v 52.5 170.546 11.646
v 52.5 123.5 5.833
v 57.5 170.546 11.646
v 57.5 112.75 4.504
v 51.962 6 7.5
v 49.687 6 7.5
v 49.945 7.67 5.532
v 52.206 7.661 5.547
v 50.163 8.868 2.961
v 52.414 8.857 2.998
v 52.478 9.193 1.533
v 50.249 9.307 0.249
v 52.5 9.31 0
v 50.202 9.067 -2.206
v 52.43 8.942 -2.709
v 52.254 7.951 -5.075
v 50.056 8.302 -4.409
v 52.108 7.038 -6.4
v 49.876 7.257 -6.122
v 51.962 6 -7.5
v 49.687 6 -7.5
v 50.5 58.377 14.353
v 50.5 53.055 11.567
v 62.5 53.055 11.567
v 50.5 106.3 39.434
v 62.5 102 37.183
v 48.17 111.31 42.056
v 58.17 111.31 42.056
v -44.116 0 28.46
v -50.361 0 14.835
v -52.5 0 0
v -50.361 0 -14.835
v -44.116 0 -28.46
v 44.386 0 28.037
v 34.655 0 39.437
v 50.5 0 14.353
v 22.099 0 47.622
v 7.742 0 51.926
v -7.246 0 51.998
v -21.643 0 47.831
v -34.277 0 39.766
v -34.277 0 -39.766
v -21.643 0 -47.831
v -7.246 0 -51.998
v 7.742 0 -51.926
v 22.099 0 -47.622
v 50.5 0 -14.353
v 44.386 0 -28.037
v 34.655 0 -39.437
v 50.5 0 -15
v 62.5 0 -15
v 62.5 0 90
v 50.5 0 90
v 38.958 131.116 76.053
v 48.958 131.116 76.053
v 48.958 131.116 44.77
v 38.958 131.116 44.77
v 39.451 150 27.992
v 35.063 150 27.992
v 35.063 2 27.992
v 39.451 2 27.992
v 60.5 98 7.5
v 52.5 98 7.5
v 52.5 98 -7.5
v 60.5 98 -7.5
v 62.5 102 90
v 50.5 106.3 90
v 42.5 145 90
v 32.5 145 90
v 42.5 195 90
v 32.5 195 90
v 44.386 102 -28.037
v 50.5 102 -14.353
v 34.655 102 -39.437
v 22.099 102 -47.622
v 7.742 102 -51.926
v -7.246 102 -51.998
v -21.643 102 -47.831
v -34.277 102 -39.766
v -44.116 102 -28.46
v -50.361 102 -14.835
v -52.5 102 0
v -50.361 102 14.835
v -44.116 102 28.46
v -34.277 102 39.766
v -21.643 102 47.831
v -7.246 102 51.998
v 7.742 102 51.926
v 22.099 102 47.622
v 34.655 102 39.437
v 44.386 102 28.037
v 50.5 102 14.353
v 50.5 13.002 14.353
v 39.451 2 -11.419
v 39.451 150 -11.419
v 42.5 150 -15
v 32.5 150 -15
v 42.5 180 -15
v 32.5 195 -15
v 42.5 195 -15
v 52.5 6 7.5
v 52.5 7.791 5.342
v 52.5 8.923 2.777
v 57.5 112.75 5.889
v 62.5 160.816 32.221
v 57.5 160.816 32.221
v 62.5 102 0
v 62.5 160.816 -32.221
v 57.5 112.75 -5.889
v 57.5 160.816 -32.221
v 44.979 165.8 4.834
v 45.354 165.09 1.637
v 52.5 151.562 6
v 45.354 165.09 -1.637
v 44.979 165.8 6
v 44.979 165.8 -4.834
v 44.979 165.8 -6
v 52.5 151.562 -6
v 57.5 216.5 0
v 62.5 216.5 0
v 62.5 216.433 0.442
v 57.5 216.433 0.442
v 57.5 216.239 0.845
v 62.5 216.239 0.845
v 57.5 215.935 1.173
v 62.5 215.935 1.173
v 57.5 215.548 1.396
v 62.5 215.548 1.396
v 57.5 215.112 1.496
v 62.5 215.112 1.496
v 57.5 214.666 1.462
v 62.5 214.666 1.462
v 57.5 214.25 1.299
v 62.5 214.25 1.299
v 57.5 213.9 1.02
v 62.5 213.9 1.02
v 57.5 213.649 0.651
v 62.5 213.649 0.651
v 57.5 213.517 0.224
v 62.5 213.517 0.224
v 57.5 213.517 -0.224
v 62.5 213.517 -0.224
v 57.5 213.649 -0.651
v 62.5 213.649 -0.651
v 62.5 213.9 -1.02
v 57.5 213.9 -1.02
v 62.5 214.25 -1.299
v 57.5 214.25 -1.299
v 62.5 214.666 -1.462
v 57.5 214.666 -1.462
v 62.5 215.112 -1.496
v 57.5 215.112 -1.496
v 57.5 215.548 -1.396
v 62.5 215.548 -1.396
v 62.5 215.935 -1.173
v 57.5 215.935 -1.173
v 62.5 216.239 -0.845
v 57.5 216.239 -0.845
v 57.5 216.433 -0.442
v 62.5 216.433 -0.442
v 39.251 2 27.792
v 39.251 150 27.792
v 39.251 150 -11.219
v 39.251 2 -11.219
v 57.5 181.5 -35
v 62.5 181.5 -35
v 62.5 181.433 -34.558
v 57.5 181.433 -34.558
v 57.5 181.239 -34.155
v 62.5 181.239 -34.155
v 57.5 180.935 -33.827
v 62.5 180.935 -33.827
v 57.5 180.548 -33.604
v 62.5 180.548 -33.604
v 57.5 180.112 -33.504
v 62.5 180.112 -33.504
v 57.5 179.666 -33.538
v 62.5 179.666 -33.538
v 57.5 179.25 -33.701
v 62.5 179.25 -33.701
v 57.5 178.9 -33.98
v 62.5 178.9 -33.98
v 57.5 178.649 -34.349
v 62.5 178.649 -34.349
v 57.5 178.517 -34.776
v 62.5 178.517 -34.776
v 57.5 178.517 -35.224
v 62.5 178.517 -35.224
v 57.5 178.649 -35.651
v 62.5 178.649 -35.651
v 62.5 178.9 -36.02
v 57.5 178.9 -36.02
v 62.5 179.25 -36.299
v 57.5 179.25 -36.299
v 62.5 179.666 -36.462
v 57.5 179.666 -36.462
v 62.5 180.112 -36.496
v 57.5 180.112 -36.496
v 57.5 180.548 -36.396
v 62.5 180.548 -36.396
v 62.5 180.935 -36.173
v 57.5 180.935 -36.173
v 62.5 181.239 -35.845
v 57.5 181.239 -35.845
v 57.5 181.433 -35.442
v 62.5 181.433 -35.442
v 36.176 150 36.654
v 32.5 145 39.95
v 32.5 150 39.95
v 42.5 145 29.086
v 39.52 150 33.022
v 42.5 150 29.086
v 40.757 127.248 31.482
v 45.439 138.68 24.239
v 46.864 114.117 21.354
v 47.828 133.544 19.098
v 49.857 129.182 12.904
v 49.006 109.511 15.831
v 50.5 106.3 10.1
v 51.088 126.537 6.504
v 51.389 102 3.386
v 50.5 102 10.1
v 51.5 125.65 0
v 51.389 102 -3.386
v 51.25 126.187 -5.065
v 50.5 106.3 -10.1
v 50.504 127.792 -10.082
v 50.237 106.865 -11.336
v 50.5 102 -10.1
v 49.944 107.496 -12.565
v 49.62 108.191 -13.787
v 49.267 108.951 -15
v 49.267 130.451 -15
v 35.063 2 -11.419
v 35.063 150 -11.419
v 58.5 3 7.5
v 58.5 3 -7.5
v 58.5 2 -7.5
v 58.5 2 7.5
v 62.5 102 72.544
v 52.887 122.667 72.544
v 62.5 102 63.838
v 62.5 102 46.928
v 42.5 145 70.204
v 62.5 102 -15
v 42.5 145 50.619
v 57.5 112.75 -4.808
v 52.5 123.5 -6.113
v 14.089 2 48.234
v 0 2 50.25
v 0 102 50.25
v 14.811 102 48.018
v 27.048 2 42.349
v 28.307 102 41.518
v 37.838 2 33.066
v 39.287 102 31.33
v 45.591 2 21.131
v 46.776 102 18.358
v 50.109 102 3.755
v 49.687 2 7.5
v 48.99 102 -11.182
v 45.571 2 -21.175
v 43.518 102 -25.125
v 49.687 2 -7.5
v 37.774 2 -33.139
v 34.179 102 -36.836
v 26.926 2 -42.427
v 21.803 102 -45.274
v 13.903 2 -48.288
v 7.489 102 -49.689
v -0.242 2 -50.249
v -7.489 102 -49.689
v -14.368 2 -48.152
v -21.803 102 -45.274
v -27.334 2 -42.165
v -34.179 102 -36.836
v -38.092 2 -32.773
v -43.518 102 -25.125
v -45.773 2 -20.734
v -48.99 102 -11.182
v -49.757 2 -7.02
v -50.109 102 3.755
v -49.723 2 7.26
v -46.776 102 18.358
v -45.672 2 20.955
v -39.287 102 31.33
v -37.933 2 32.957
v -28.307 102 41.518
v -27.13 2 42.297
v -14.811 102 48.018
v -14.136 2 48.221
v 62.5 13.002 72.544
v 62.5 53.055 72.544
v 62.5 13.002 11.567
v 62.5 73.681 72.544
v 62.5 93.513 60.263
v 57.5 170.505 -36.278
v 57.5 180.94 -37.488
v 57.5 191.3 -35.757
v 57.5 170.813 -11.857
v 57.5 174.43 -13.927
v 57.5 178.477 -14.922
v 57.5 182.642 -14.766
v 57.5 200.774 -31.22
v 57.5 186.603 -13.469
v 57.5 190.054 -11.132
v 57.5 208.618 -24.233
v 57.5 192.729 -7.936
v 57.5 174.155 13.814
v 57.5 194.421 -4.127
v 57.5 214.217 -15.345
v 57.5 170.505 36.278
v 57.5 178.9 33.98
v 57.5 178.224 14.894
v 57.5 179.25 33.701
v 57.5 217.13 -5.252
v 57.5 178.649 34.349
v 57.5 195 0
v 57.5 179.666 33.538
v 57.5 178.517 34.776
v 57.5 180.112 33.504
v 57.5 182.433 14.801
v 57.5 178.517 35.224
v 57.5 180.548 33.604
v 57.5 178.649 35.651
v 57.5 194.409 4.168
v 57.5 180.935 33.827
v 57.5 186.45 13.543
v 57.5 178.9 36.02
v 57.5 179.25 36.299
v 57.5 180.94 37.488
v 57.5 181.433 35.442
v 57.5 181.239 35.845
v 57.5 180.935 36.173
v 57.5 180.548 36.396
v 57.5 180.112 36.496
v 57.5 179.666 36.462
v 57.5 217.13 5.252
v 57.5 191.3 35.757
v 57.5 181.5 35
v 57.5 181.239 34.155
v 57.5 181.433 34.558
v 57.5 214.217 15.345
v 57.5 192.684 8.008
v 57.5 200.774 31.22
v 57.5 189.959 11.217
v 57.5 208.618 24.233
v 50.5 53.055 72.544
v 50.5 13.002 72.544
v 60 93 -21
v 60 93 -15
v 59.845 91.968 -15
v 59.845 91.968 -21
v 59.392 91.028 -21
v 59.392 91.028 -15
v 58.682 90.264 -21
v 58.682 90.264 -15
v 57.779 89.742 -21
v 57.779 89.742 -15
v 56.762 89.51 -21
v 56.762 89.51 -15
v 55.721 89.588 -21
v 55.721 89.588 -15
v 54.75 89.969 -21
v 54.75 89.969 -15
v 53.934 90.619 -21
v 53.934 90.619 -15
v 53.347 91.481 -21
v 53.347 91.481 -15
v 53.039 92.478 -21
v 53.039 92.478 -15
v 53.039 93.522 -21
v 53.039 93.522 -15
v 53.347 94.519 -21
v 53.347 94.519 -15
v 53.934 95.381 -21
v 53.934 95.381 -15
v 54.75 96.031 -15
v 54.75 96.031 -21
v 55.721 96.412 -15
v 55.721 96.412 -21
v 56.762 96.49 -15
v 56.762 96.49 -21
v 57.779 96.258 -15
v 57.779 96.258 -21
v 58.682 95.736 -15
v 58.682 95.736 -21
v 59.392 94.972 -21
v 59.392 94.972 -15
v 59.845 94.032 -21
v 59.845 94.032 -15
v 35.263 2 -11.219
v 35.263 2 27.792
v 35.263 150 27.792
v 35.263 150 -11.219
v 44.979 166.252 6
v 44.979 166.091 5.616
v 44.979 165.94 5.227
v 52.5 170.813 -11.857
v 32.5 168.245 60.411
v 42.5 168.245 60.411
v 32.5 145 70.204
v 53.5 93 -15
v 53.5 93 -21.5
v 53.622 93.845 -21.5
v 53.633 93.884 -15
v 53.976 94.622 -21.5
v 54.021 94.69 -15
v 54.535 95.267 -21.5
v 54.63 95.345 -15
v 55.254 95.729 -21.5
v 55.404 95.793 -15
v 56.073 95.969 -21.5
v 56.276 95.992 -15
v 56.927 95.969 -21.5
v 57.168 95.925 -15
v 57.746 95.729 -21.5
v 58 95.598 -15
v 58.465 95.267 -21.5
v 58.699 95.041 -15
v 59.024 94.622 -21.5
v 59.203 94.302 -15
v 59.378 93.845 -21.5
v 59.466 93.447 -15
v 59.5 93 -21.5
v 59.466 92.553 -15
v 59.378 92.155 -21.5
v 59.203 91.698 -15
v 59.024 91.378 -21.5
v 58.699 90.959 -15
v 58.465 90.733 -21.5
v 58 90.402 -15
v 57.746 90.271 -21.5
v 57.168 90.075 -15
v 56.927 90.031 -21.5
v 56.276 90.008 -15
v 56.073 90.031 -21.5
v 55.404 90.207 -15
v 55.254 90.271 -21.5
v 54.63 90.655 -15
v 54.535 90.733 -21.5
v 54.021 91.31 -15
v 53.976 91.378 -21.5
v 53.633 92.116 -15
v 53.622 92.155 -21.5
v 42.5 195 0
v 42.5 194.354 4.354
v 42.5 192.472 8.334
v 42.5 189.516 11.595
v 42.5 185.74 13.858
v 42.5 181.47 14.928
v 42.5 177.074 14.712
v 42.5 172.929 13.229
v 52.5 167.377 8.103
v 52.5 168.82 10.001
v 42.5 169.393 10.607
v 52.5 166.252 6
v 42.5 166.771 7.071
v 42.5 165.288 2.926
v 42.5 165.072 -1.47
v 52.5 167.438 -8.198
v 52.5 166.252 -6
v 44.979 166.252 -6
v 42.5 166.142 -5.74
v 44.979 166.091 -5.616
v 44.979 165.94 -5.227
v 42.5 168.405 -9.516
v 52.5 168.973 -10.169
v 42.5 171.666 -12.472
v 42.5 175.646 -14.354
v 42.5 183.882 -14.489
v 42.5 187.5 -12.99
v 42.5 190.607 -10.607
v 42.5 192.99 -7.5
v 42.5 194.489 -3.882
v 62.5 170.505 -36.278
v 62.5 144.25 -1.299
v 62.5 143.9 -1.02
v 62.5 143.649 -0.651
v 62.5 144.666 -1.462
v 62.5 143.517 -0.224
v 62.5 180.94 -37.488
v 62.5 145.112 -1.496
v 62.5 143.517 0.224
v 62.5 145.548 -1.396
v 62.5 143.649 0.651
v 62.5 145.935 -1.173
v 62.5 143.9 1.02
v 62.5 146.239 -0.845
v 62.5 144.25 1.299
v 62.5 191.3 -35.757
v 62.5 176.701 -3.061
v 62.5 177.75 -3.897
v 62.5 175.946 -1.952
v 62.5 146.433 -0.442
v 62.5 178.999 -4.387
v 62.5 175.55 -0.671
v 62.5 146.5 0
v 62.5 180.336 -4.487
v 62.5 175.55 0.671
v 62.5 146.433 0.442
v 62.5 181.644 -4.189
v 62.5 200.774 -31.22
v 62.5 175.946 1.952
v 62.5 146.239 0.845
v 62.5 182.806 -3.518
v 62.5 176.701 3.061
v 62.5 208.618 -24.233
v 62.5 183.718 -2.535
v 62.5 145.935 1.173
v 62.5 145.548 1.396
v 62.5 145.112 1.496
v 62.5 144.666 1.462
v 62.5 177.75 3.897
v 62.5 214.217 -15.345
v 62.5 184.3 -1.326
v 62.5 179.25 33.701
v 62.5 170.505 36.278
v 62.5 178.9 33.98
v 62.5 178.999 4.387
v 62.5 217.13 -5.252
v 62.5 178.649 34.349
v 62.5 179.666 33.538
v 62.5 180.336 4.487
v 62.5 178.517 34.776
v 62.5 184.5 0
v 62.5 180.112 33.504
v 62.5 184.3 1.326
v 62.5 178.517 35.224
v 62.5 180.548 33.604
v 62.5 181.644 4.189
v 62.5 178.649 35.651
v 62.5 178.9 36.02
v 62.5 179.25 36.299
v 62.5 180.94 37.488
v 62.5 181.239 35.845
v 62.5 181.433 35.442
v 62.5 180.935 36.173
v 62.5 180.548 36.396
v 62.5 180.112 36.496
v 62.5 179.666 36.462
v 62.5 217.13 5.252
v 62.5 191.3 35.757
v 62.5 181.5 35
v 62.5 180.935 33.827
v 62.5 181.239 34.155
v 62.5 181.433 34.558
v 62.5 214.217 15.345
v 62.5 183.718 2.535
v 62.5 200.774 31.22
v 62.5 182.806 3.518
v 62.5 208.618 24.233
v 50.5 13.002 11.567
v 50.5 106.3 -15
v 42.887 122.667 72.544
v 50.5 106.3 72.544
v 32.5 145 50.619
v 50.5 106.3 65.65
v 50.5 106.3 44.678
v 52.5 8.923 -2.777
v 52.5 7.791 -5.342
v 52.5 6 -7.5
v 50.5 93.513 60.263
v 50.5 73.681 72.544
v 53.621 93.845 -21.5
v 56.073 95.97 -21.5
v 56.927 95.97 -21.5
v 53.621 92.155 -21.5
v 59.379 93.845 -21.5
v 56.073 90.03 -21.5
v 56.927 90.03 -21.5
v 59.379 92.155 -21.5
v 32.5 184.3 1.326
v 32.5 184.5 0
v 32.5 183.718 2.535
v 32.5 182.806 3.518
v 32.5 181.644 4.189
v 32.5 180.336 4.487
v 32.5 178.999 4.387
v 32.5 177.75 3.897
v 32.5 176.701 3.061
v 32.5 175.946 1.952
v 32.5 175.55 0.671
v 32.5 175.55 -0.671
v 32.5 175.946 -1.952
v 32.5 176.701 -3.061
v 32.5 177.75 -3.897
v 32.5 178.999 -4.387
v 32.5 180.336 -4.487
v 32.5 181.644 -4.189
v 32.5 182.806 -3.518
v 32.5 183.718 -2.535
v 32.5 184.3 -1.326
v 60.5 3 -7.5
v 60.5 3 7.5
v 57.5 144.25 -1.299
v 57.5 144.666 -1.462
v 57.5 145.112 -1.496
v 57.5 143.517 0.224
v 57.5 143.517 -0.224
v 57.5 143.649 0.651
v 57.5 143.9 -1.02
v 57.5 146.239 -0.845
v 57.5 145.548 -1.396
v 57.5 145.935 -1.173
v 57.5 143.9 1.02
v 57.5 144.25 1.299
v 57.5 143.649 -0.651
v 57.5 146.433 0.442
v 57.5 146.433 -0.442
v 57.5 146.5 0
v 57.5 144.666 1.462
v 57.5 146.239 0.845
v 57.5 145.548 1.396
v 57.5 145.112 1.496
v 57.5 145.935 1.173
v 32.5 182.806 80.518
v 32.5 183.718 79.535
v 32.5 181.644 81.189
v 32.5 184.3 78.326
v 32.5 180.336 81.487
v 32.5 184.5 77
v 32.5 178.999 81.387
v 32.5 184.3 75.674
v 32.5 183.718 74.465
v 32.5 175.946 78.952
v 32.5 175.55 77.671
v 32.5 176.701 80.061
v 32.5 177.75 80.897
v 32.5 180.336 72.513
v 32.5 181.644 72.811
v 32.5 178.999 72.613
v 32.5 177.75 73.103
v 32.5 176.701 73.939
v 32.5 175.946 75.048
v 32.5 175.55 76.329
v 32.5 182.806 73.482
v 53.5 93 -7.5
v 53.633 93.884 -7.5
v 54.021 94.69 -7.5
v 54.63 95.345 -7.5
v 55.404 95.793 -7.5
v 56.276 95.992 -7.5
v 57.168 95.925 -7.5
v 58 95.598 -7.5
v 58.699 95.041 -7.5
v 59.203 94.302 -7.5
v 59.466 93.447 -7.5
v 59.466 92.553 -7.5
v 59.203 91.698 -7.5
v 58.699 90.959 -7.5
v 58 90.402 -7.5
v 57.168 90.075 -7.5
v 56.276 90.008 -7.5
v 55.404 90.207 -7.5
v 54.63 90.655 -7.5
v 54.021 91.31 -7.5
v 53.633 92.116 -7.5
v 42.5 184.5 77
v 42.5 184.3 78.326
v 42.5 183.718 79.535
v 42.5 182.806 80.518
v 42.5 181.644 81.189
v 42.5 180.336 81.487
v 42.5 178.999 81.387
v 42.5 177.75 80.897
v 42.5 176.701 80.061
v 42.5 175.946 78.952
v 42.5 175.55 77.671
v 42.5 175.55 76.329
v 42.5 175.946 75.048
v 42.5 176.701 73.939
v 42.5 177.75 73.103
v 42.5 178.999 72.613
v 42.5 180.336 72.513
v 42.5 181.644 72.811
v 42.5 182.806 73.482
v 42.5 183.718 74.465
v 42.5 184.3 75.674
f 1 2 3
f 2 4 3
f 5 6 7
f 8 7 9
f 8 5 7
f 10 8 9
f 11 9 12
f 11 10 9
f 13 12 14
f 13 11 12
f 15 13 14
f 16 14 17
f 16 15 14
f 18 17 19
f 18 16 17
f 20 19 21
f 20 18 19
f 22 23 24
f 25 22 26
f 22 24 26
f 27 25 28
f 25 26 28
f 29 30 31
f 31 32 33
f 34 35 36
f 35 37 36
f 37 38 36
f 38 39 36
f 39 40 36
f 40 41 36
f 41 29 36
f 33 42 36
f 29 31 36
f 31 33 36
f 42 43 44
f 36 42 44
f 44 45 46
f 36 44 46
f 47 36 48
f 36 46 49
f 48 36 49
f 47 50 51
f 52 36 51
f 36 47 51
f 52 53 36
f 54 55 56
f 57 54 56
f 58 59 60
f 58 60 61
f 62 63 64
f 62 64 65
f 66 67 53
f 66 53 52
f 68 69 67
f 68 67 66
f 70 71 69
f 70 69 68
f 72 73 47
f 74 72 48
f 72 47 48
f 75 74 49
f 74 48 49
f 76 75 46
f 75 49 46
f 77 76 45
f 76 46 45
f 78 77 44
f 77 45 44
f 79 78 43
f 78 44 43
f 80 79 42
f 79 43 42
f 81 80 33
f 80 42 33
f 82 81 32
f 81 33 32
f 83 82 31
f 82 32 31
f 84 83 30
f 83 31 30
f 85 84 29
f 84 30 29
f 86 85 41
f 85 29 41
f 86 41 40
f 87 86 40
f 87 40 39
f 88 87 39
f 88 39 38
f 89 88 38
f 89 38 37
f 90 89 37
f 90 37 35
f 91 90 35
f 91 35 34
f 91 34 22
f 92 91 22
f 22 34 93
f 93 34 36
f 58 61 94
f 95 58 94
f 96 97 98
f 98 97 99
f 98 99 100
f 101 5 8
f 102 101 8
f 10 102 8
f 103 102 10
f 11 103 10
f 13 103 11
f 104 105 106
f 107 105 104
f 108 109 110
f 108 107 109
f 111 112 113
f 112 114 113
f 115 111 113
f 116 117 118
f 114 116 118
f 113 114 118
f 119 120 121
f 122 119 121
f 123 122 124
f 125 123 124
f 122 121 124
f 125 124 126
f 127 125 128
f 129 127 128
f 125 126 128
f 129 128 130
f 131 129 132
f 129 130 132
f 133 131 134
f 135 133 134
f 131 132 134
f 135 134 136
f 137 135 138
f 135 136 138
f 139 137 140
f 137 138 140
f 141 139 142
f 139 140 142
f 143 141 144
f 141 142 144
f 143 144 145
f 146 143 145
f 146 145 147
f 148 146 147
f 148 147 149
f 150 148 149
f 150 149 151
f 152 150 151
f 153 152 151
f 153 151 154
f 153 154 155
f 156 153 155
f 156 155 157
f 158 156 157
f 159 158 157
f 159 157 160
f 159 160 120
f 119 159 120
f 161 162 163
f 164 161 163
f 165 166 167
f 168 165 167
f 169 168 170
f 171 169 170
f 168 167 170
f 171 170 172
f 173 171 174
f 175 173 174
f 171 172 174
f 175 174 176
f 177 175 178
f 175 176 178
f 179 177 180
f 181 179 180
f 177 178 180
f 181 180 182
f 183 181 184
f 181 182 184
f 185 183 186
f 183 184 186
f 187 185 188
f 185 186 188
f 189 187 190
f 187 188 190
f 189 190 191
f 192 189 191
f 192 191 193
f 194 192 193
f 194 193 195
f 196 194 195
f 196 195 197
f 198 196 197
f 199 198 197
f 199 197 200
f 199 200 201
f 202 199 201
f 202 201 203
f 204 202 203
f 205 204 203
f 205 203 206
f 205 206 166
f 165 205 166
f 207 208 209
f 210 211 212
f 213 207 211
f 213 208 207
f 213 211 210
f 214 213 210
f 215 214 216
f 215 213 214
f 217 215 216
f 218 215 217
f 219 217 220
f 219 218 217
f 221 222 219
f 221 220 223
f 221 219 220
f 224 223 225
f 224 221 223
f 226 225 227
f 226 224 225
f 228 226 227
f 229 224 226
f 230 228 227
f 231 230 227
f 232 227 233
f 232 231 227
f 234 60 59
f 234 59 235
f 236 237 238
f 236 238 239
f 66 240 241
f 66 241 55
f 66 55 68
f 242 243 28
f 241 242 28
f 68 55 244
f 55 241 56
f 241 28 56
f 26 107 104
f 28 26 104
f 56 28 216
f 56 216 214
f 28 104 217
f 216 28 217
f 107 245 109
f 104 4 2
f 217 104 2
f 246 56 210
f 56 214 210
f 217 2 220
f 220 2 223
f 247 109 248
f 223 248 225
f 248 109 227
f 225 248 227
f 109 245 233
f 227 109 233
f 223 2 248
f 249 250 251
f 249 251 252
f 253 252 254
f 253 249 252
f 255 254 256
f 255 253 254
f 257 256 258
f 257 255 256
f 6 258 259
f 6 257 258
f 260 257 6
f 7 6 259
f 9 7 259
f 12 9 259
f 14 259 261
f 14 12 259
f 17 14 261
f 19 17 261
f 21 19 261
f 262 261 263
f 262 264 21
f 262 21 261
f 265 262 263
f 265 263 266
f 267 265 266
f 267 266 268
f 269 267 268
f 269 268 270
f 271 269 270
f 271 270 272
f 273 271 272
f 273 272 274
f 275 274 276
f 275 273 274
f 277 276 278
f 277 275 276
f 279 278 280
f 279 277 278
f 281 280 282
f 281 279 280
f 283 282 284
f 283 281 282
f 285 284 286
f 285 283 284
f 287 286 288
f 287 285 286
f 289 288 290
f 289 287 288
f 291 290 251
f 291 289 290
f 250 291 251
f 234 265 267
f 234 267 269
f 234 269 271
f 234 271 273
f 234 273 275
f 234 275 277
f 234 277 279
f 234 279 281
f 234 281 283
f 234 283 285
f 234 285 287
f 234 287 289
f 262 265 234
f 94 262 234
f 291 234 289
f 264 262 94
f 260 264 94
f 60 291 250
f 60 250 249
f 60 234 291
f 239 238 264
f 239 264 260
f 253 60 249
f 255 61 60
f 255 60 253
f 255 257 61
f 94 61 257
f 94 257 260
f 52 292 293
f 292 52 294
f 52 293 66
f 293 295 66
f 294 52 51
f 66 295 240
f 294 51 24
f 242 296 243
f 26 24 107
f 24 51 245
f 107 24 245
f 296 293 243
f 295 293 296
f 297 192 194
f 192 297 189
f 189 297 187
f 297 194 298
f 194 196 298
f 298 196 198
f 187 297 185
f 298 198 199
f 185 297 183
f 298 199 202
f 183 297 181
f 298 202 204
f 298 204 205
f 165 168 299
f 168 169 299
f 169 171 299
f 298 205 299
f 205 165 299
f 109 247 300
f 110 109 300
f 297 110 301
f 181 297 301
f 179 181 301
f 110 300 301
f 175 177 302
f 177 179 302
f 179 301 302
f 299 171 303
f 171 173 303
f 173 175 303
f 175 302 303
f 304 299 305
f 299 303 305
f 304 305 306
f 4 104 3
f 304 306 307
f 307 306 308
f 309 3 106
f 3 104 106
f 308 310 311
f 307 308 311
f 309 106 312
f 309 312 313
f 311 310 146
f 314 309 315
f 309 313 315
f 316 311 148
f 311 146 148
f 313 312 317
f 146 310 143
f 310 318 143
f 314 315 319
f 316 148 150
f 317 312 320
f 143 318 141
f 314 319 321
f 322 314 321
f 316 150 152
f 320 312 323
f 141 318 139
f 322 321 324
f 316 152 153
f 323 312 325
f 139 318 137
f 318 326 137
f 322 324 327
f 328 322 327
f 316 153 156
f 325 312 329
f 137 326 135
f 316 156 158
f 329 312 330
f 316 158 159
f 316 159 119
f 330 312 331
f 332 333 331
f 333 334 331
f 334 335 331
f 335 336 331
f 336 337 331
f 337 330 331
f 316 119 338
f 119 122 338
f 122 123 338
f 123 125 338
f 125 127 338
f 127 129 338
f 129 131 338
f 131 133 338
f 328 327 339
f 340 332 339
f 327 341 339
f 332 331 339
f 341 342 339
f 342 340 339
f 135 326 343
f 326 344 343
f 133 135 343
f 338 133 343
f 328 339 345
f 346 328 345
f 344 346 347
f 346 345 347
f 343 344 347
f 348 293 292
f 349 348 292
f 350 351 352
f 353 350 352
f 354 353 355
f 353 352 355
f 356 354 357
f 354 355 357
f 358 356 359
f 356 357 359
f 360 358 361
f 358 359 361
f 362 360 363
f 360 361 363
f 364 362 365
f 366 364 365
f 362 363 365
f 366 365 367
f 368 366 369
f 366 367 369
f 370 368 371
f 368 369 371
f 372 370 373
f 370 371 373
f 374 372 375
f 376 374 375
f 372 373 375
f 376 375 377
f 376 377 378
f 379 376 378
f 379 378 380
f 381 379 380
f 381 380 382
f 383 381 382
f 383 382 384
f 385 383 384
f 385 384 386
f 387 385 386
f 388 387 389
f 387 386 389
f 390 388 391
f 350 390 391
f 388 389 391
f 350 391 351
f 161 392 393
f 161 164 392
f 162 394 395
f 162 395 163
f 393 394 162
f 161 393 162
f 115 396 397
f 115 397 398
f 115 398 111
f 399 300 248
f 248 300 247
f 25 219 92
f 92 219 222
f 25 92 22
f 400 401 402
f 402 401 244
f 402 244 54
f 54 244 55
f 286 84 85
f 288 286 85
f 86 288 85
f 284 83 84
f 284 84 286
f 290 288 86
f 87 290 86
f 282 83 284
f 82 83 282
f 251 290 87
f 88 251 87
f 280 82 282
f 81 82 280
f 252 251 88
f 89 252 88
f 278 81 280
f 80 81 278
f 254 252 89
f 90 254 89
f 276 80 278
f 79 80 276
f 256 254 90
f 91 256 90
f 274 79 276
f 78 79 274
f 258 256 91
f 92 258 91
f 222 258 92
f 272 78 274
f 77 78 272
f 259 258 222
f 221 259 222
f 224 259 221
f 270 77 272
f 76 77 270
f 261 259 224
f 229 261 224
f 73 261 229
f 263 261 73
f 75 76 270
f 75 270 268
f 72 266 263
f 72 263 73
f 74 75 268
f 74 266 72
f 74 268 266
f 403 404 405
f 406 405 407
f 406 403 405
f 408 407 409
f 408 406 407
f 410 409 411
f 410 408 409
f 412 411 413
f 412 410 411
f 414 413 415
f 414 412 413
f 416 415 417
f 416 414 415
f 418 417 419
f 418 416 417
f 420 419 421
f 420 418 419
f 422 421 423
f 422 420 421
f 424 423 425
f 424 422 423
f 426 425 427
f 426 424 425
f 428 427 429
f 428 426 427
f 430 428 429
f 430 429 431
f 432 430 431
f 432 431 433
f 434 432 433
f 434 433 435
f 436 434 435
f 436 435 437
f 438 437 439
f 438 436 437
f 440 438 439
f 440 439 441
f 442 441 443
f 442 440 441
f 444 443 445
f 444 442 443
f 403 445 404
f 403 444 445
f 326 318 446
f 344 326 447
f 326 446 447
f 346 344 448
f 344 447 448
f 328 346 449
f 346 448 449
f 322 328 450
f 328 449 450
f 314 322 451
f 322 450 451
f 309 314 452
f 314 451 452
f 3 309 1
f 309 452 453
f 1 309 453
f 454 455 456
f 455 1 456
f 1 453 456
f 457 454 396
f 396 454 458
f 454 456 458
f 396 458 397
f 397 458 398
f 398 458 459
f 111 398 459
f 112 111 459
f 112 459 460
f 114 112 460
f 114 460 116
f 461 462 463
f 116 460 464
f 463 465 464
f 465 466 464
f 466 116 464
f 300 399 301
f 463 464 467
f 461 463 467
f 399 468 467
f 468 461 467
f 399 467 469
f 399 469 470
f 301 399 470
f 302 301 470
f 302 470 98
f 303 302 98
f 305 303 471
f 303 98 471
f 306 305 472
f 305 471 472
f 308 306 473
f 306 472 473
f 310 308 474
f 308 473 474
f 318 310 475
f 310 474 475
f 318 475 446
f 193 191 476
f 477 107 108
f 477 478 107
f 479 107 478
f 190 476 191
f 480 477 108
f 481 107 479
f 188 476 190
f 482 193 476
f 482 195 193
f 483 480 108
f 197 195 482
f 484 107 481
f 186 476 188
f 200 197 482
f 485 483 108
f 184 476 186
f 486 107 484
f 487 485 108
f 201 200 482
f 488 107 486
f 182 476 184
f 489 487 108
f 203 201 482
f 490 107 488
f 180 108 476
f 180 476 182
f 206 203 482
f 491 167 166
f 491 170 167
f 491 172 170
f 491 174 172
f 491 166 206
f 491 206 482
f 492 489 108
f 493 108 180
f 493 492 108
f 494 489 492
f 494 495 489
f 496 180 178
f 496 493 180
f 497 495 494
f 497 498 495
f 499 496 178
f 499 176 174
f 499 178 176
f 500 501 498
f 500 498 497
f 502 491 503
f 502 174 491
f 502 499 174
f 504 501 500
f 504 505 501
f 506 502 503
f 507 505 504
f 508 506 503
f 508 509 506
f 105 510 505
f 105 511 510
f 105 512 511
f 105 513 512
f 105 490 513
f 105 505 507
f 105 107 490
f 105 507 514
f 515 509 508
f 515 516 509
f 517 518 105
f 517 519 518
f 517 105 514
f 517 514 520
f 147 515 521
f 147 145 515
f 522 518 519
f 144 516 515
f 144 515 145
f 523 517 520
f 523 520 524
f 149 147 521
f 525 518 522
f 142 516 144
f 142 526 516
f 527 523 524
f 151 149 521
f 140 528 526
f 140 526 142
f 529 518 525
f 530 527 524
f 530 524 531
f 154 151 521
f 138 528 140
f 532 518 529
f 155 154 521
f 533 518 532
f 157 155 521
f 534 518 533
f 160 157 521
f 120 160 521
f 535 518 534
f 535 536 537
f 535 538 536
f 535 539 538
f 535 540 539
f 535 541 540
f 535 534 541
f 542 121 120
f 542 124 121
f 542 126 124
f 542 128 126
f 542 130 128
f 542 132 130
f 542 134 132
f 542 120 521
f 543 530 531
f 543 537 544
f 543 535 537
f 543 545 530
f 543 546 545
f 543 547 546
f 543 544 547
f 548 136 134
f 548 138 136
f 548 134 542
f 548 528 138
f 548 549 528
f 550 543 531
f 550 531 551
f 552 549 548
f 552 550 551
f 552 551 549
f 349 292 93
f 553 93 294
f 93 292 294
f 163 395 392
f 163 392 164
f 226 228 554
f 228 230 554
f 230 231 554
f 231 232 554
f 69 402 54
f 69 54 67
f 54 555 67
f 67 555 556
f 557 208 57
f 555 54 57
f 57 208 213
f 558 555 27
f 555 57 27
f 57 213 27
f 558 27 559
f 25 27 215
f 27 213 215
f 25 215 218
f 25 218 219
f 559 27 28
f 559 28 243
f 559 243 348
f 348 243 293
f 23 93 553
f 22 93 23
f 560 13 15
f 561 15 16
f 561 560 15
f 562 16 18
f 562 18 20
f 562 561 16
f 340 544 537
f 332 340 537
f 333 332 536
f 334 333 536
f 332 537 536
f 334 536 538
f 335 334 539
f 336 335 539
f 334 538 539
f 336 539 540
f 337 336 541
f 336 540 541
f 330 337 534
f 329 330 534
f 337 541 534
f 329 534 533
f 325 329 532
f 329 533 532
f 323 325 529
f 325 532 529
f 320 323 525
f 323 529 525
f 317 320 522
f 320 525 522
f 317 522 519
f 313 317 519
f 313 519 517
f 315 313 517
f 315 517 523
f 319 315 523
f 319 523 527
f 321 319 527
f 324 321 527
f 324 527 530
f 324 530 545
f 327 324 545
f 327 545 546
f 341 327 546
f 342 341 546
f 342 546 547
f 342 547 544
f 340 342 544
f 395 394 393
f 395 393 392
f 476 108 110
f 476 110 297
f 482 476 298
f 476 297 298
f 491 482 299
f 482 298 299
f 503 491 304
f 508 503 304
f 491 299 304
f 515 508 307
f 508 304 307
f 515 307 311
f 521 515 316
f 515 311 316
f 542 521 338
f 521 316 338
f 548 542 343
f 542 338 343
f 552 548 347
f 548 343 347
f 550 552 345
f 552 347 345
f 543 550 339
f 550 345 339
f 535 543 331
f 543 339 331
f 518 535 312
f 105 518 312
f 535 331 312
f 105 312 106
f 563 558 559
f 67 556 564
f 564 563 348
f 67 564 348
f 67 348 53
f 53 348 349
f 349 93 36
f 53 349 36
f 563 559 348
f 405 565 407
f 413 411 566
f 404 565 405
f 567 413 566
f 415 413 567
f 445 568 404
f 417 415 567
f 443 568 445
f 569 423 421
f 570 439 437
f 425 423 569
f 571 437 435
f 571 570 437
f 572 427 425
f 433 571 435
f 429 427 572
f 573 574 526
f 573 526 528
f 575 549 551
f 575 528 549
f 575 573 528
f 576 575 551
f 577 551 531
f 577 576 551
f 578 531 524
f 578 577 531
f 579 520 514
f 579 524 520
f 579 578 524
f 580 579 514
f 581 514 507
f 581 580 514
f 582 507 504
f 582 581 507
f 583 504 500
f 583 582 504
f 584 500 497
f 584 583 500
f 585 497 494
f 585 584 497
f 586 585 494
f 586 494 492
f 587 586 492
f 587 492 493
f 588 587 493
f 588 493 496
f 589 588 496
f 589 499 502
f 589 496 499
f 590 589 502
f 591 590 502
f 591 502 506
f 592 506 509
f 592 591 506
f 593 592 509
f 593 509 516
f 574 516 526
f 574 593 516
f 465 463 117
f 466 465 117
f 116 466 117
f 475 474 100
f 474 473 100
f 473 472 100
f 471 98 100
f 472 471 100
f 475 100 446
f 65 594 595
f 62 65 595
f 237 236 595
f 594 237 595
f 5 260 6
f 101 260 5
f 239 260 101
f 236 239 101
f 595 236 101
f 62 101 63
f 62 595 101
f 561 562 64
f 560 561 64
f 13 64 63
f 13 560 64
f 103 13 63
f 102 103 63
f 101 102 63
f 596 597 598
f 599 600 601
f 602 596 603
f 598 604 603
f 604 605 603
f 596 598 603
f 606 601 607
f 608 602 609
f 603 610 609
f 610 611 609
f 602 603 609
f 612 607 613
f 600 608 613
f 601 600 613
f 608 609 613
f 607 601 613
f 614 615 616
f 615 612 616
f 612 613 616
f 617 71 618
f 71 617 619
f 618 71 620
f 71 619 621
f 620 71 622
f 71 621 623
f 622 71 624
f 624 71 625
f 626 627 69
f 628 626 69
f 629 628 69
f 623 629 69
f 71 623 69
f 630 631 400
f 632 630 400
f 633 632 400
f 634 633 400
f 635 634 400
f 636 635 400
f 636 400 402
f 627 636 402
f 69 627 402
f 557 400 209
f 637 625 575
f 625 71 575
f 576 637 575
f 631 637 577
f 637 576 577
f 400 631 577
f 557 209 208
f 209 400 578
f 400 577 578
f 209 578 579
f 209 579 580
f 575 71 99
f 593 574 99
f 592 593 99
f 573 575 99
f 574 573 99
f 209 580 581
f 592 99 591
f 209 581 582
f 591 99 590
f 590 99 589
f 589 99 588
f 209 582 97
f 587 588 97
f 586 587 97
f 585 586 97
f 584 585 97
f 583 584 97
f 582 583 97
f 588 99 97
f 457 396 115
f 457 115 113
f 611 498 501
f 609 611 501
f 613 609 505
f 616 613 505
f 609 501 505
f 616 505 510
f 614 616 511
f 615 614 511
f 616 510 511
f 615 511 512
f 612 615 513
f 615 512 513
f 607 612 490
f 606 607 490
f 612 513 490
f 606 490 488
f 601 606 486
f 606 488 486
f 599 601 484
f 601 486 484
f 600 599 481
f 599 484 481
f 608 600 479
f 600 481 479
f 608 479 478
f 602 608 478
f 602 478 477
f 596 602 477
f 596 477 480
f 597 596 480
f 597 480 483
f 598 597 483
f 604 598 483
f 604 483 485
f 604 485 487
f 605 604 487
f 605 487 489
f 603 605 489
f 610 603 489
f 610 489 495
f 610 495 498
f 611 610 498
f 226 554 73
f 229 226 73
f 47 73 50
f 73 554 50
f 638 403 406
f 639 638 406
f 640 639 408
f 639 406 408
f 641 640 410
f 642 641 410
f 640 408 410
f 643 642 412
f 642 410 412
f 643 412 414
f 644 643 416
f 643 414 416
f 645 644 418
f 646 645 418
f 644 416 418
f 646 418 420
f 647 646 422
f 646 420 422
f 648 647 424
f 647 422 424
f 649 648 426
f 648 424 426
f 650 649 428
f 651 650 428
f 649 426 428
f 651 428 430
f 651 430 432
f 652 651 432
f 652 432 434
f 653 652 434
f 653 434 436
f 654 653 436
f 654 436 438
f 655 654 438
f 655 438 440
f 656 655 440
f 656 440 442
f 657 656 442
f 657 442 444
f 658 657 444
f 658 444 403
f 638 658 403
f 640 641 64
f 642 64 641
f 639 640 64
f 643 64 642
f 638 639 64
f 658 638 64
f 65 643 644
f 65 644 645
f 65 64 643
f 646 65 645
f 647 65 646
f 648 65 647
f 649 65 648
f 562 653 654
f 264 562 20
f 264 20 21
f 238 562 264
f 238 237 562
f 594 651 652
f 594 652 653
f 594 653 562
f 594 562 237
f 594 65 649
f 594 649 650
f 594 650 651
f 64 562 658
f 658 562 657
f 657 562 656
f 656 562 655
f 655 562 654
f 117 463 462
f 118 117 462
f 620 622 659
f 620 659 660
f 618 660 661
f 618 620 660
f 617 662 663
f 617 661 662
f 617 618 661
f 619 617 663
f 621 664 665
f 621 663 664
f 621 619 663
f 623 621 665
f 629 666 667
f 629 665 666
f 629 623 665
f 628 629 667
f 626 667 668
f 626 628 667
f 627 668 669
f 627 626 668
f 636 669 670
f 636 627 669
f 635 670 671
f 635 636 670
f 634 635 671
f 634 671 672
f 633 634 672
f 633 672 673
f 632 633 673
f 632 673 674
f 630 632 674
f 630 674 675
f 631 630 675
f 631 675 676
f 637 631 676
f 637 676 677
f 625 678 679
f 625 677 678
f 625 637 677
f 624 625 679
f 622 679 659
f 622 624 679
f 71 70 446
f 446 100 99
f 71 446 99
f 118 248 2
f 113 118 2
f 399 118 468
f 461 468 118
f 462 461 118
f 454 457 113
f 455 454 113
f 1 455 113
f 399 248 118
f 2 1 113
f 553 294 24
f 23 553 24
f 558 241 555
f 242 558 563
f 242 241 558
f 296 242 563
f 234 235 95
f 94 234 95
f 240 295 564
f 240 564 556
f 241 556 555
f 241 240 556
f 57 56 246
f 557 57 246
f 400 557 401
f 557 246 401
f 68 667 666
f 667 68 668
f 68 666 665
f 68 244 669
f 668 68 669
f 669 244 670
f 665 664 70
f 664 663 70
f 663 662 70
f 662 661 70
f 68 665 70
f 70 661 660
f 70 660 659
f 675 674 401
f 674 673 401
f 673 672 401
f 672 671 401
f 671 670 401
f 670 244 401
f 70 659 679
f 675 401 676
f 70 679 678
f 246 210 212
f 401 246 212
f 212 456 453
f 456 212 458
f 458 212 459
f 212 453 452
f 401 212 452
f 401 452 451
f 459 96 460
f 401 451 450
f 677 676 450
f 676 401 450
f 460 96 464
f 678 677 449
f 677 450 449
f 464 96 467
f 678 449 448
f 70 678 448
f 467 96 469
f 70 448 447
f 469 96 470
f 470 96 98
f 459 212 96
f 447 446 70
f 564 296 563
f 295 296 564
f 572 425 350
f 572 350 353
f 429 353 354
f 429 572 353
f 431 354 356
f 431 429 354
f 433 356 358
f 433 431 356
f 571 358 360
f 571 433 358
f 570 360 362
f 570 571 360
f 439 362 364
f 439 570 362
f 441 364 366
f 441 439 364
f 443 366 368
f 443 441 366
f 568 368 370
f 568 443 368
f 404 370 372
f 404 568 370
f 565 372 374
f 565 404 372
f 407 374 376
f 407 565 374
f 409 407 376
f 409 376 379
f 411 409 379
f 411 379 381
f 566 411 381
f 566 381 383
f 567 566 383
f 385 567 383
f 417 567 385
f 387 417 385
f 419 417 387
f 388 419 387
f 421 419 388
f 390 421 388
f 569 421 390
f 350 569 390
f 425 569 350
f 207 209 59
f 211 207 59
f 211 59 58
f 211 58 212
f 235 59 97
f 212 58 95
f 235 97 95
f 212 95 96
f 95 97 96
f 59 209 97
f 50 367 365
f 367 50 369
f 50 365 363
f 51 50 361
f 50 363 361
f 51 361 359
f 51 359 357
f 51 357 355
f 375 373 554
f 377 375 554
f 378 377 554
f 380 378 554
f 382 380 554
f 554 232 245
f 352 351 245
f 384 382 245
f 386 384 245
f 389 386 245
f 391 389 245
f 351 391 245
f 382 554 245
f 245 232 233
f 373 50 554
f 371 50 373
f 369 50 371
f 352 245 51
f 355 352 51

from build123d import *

# Parameters (mm, degrees)
SKETCH1_R                = 52.5
BOSS_EXTRUDE1_DEPTH      = 2
SKETCH2_R                = 52.5
SKETCH2_R_2              = 50.25
BOSS_EXTRUDE2_DEPTH      = 100
BOSS_EXTRUDE3_DEPTH      = 90
BOSS_EXTRUDE3_DEPTH_BACK = 15
BOSS_EXTRUDE4_DEPTH      = 15
BOSS_EXTRUDE4_DEPTH_BACK = 10
SKETCH7_R                = 15
SKETCH8_R                = 37.5
BOSS_EXTRUDE5_DEPTH      = 5
SKETCH9_R                = 1.5
CUT_EXTRUDE1_DEPTH       = 6
CUT_EXTRUDE2_DEPTH       = 265.804278799
CUT_EXTRUDE2_DEPTH_BACK  = 265.804278799
SKETCH5_R                = 4.5
CUT_EXTRUDE3_START       = -4
CUT_EXTRUDE3_DEPTH       = 20
CUT_EXTRUDE4_START       = -3
SKETCH11_W               = 8
SKETCH11_H               = 15
CUT_EXTRUDE4_DEPTH       = 95
SKETCH12_R               = 3
CUT_EXTRUDE5_DEPTH       = 20
SKETCH13_R               = 3.5
SKETCH13_R_2             = 3
BOSS_EXTRUDE6_DEPTH      = 6.5
CHAMFER1_SIZE            = 0.5
SKETCH14_R               = 51.5
CUT_EXTRUDE6_DEPTH       = 48
SKETCH15_R               = 1.5
BOSS_EXTRUDE7_DEPTH      = 5
BOSS_EXTRUDE8_DEPTH      = 5
BOSS_EXTRUDE9_DEPTH      = 6
BOSS_EXTRUDE9_DEPTH_BACK = 6
SKETCH18_W               = 4.388119868
SKETCH18_H               = 39.410417959
SKETCH18_W_2             = 3.988119868
SKETCH18_H_2             = 39.010417959
BOSS_EXTRUDE10_DEPTH     = 148
CUT_EXTRUDE7_DEPTH       = 12
CUT_EXTRUDE8_REACH       = 263.976


with BuildPart() as part:
    # Sketch1 → Boss-Extrude1 (new body)
    with BuildSketch(Plane(origin=(0, 0, 0), x_dir=(1, 0, 0), z_dir=(0, 1, 0))):
        with Locations(Location((0, 0, 0), (0, 0, 270))):
            Circle(SKETCH1_R)
    extrude(amount=BOSS_EXTRUDE1_DEPTH)

    # Sketch2 → Boss-Extrude2 (add)
    with BuildSketch(Plane(origin=(0, 2, 0), x_dir=(1, 0, 0), z_dir=(0, 1, 0))):
        with Locations(Location((0, 0, 0), (0, 0, 270))):
            Circle(SKETCH2_R)
        with Locations(Location((0, 0, 0), (0, 0, 270))):
            Circle(SKETCH2_R_2, mode=Mode.SUBTRACT)
    extrude(amount=BOSS_EXTRUDE2_DEPTH)


with BuildPart() as body_2:
    # Sketch6 → Boss-Extrude3 (new, two sides: drawn at the far end of the back side and taken through both)
    with BuildSketch(Plane.XY.offset(-BOSS_EXTRUDE3_DEPTH_BACK)):
        Polygon((32.5, 195), (32.5, 145), (50.5, 106.3), (50.5, 0), (52.5, 0), (62.5, 0), (62.5, 102), (42.5, 145), (42.5, 195), align=None)
    extrude(amount=BOSS_EXTRUDE3_DEPTH + BOSS_EXTRUDE3_DEPTH_BACK)

    # Sketch7 → Boss-Extrude4 (add, two sides: drawn at the far end of the back side and taken through both)
    with BuildSketch(Plane(origin=(42.5, 0, 0), x_dir=(0, 0, -1), z_dir=(1, 0, 0)).offset(-BOSS_EXTRUDE4_DEPTH_BACK)):
        with Locations(Location((0, 180, 0), (0, 0, 90))):
            Circle(SKETCH7_R)
    extrude(amount=BOSS_EXTRUDE4_DEPTH + BOSS_EXTRUDE4_DEPTH_BACK)

    # Sketch8 → Boss-Extrude5 (add)
    with BuildSketch(Plane(origin=(57.5, 0, 0), x_dir=(0, 0, -1), z_dir=(1, 0, 0))):
        with Locations(Location((0, 180, 0), (0, 0, 90))):
            Circle(SKETCH8_R)
    extrude(amount=BOSS_EXTRUDE5_DEPTH)

    # Sketch9 → Cut-Extrude1 (cut)
    with BuildSketch(Plane(origin=(62.5, 0, 0), x_dir=(0, 0, -1), z_dir=(1, 0, 0))):
        with Locations(Location((-35, 180, 0), (0, 0, 90))):
            Circle(SKETCH9_R)
        with Locations(Location((0, 215, 0), (0, 0, 90))):
            Circle(SKETCH9_R)
        with Locations(Location((35, 180, 0), (0, 0, 90))):
            Circle(SKETCH9_R)
        with Locations(Location((0, 145, 0), (0, 0, 90))):
            Circle(SKETCH9_R)
    extrude(amount=-CUT_EXTRUDE1_DEPTH, mode=Mode.SUBTRACT)

    # Sketch5 → Cut-Extrude2 (cut, two sides: drawn at the far end of the back side and taken through both)
    with BuildSketch(Plane(origin=(68.805630826, 0, 0), x_dir=(0, 0, -1), z_dir=(1, 0, 0)).offset(-CUT_EXTRUDE2_DEPTH_BACK)):
        with Locations(Location((0, 180, 0), (0, 0, 90))):
            Circle(SKETCH5_R)
        with Locations(Location((-77, 180, 0), (0, 0, 90))):
            Circle(SKETCH5_R)
    extrude(amount=CUT_EXTRUDE2_DEPTH + CUT_EXTRUDE2_DEPTH_BACK, mode=Mode.SUBTRACT)


with BuildPart() as cut_extrude3_tool:
    # Sketch10 → Cut-Extrude3 (new body)
    with BuildSketch(Plane(origin=(62.5, 0, 0), x_dir=(0, 0, -1), z_dir=(1, 0, 0)).offset(CUT_EXTRUDE3_START)):
        with BuildLine():
            Line((7.5, 2), (-7.5, 2))
            Line((-7.5, 2), (-7.5, 6))
            ThreePointArc((-7.5, 6), (0, 9.309773059), (7.5, 6))
            Line((7.5, 6), (7.5, 2))
        make_face()
    extrude(amount=-CUT_EXTRUDE3_DEPTH)


with BuildPart() as part_1:
    add(part.part)

    # Cut-Extrude3: cut by cut_extrude3_tool
    add(cut_extrude3_tool.part, mode=Mode.SUBTRACT)



with BuildPart() as body_2_1:
    add(body_2.part)

    # Cut-Extrude3: cut by cut_extrude3_tool
    add(cut_extrude3_tool.part, mode=Mode.SUBTRACT)

    # Sketch11 → Cut-Extrude4 (cut)
    with BuildSketch(Plane.XZ.offset(CUT_EXTRUDE4_START)):
        with Locations((56.5, 0)):
            Rectangle(SKETCH11_W, SKETCH11_H)
    extrude(amount=-CUT_EXTRUDE4_DEPTH, mode=Mode.SUBTRACT)

    # Sketch12 → Cut-Extrude5 (cut)
    with BuildSketch(Plane(origin=(0, 0, -15), x_dir=(-1, 0, 0), z_dir=(0, 0, -1))):
        with Locations((-56.5, 93)):
            Circle(SKETCH12_R)
    extrude(amount=-CUT_EXTRUDE5_DEPTH, mode=Mode.SUBTRACT)

    # Sketch13 → Boss-Extrude6 (add)
    with BuildSketch(Plane(origin=(0, 0, -15), x_dir=(-1, 0, 0), z_dir=(0, 0, -1))):
        with Locations(Location((-56.5, 93, 0), (0, 0, 180))):
            Circle(SKETCH13_R)
        with Locations((-56.5, 93)):
            Circle(SKETCH13_R_2, mode=Mode.SUBTRACT)
    extrude(amount=BOSS_EXTRUDE6_DEPTH)

    # Chamfer1
    chamfer1_edges = [body_2_1.edges().sort_by_distance(p)[0] for p in [
        (53, 93, -21.5),
    ]]
    chamfer(chamfer1_edges, length=CHAMFER1_SIZE - 0.0001)  # a hair under: the kernel refuses the full size

    # Sketch14 → Cut-Extrude6 (cut)
    with BuildSketch(Plane(origin=(0, 102, 0), x_dir=(1, 0, 0), z_dir=(0, 1, 0))):
        Circle(SKETCH14_R)
    extrude(amount=CUT_EXTRUDE6_DEPTH, mode=Mode.SUBTRACT)

    # Sketch15 → Boss-Extrude7 (add)
    with BuildSketch(Plane(origin=(62.5, 0, 0), x_dir=(0, 0, -1), z_dir=(1, 0, 0))):
        Polygon((-33.512753614, 163.173076775), (0, 102), (33.512753614, 163.173076775), align=None)
        with Locations(Location((0, 145, 0), (0, 0, 90))):
            Circle(SKETCH15_R, mode=Mode.SUBTRACT)
    extrude(amount=-BOSS_EXTRUDE7_DEPTH)

    # Sketch16 → Boss-Extrude8 (add)
    with BuildSketch(Plane.ZY.offset(-57.5)):
        Polygon((-11.8572367, 170.812729576), (-3.863517383, 104.969648), (3.542835396, 104.969648), (11.646025701, 170.546424731), align=None)
    extrude(amount=BOSS_EXTRUDE8_DEPTH)

    # Sketch17 → Boss-Extrude9 (add, two sides: drawn at the far end of the back side and taken through both)
    with BuildSketch(Plane.XY.offset(-BOSS_EXTRUDE9_DEPTH_BACK)):
        Polygon((44.979042662, 173.247563953), (44.979042662, 165.800390699), (53.161932833, 150.308684598), (53.161932833, 173.247563953), align=None)
    extrude(amount=BOSS_EXTRUDE9_DEPTH + BOSS_EXTRUDE9_DEPTH_BACK)


with BuildPart() as part_2:
    add(part_1.part)

    add(body_2_1.part)  # Boss-Extrude10 merges body 2
    # Sketch18 → Boss-Extrude10 (add)
    with BuildSketch(Plane(origin=(0, 2, 0), x_dir=(1, 0, 0), z_dir=(0, 1, 0))):
        with Locations((37.256595202, -8.286604054)):
            Rectangle(SKETCH18_W, SKETCH18_H)
        with Locations((37.256595202, -8.286604053)):
            Rectangle(SKETCH18_W_2, SKETCH18_H_2, mode=Mode.SUBTRACT)
    extrude(amount=BOSS_EXTRUDE10_DEPTH)

    # Sketch19 → Cut-Extrude7 (cut)
    with BuildSketch(Plane(origin=(62.5, 0, 0), x_dir=(0, 0, -1), z_dir=(1, 0, 0))):
        Polygon((-72.544377907, 13.00185454), (-11.567320289, 13.00185454), (-11.567320289, 53.055277221), (-42.055849098, 111.310144767), (-72.544377907, 53.055277221), align=None)
        Polygon((-76.052706901, 131.115597336), (-44.770106705, 131.115597336), (-60.411406803, 168.245412522), align=None)
        Polygon((-72.544377907, 73.680676562), (-72.544377907, 122.667191379), (-60.262958239, 93.513167119), align=None)
    extrude(amount=-CUT_EXTRUDE7_DEPTH, mode=Mode.SUBTRACT)

    # Cut-Extrude8: up to this face of the body (flat: up to its plane)
    cut_extrude8_end = Plane(part_2.part.faces().sort_by_distance((42.166193849, 124.217683224, 58.964397348))[0])
    # Sketch19<2> → Cut-Extrude8 (cut, up to the picked face)
    with BuildSketch(Plane(origin=(62.5, 0, 0), x_dir=(0, 0, -1), z_dir=(1, 0, 0)), mode=Mode.PRIVATE) as cut_extrude8_sk1:
        Polygon((-72.544377907, 13.00185454), (-11.567320289, 13.00185454), (-11.567320289, 53.055277221), (-42.055849098, 111.310144767), (-72.544377907, 53.055277221), align=None)
    cut_extrude8_tool1 = split(extrude(cut_extrude8_sk1.sketch, amount=-CUT_EXTRUDE8_REACH, mode=Mode.PRIVATE), bisect_by=cut_extrude8_end, keep=Keep.BOTH, mode=Mode.PRIVATE)
    # Sketch19<2> → Cut-Extrude8 (cut, up to the picked face)
    with BuildSketch(Plane(origin=(62.5, 0, 0), x_dir=(0, 0, -1), z_dir=(1, 0, 0)), mode=Mode.PRIVATE) as cut_extrude8_sk2:
        Polygon((-76.052706901, 131.115597336), (-44.770106705, 131.115597336), (-60.411406803, 168.245412522), align=None)
    cut_extrude8_tool2 = split(extrude(cut_extrude8_sk2.sketch, amount=-CUT_EXTRUDE8_REACH, mode=Mode.PRIVATE), bisect_by=cut_extrude8_end, keep=Keep.BOTH, mode=Mode.PRIVATE)
    # Sketch19<2> → Cut-Extrude8 (cut, up to the picked face)
    with BuildSketch(Plane(origin=(62.5, 0, 0), x_dir=(0, 0, -1), z_dir=(1, 0, 0)), mode=Mode.PRIVATE) as cut_extrude8_sk3:
        Polygon((-72.544377907, 73.680676562), (-72.544377907, 122.667191379), (-60.262958239, 93.513167119), align=None)
    cut_extrude8_tool3 = split(extrude(cut_extrude8_sk3.sketch, amount=-CUT_EXTRUDE8_REACH, mode=Mode.PRIVATE), bisect_by=cut_extrude8_end, keep=Keep.BOTH, mode=Mode.PRIVATE)
    add(cut_extrude8_tool1.solids().sort_by(Axis((62.5, 49.636219, 42.055849), (-1, 0, 0)))[0], mode=Mode.SUBTRACT)
    add(cut_extrude8_tool2.solids().sort_by(Axis((62.5, 143.492202, 60.411407), (-1, 0, 0)))[0], mode=Mode.SUBTRACT)
    add(cut_extrude8_tool3.solids().sort_by(Axis((62.5, 96.620345, 68.450571), (-1, 0, 0)))[0], mode=Mode.SUBTRACT)


solid = part_2.part
